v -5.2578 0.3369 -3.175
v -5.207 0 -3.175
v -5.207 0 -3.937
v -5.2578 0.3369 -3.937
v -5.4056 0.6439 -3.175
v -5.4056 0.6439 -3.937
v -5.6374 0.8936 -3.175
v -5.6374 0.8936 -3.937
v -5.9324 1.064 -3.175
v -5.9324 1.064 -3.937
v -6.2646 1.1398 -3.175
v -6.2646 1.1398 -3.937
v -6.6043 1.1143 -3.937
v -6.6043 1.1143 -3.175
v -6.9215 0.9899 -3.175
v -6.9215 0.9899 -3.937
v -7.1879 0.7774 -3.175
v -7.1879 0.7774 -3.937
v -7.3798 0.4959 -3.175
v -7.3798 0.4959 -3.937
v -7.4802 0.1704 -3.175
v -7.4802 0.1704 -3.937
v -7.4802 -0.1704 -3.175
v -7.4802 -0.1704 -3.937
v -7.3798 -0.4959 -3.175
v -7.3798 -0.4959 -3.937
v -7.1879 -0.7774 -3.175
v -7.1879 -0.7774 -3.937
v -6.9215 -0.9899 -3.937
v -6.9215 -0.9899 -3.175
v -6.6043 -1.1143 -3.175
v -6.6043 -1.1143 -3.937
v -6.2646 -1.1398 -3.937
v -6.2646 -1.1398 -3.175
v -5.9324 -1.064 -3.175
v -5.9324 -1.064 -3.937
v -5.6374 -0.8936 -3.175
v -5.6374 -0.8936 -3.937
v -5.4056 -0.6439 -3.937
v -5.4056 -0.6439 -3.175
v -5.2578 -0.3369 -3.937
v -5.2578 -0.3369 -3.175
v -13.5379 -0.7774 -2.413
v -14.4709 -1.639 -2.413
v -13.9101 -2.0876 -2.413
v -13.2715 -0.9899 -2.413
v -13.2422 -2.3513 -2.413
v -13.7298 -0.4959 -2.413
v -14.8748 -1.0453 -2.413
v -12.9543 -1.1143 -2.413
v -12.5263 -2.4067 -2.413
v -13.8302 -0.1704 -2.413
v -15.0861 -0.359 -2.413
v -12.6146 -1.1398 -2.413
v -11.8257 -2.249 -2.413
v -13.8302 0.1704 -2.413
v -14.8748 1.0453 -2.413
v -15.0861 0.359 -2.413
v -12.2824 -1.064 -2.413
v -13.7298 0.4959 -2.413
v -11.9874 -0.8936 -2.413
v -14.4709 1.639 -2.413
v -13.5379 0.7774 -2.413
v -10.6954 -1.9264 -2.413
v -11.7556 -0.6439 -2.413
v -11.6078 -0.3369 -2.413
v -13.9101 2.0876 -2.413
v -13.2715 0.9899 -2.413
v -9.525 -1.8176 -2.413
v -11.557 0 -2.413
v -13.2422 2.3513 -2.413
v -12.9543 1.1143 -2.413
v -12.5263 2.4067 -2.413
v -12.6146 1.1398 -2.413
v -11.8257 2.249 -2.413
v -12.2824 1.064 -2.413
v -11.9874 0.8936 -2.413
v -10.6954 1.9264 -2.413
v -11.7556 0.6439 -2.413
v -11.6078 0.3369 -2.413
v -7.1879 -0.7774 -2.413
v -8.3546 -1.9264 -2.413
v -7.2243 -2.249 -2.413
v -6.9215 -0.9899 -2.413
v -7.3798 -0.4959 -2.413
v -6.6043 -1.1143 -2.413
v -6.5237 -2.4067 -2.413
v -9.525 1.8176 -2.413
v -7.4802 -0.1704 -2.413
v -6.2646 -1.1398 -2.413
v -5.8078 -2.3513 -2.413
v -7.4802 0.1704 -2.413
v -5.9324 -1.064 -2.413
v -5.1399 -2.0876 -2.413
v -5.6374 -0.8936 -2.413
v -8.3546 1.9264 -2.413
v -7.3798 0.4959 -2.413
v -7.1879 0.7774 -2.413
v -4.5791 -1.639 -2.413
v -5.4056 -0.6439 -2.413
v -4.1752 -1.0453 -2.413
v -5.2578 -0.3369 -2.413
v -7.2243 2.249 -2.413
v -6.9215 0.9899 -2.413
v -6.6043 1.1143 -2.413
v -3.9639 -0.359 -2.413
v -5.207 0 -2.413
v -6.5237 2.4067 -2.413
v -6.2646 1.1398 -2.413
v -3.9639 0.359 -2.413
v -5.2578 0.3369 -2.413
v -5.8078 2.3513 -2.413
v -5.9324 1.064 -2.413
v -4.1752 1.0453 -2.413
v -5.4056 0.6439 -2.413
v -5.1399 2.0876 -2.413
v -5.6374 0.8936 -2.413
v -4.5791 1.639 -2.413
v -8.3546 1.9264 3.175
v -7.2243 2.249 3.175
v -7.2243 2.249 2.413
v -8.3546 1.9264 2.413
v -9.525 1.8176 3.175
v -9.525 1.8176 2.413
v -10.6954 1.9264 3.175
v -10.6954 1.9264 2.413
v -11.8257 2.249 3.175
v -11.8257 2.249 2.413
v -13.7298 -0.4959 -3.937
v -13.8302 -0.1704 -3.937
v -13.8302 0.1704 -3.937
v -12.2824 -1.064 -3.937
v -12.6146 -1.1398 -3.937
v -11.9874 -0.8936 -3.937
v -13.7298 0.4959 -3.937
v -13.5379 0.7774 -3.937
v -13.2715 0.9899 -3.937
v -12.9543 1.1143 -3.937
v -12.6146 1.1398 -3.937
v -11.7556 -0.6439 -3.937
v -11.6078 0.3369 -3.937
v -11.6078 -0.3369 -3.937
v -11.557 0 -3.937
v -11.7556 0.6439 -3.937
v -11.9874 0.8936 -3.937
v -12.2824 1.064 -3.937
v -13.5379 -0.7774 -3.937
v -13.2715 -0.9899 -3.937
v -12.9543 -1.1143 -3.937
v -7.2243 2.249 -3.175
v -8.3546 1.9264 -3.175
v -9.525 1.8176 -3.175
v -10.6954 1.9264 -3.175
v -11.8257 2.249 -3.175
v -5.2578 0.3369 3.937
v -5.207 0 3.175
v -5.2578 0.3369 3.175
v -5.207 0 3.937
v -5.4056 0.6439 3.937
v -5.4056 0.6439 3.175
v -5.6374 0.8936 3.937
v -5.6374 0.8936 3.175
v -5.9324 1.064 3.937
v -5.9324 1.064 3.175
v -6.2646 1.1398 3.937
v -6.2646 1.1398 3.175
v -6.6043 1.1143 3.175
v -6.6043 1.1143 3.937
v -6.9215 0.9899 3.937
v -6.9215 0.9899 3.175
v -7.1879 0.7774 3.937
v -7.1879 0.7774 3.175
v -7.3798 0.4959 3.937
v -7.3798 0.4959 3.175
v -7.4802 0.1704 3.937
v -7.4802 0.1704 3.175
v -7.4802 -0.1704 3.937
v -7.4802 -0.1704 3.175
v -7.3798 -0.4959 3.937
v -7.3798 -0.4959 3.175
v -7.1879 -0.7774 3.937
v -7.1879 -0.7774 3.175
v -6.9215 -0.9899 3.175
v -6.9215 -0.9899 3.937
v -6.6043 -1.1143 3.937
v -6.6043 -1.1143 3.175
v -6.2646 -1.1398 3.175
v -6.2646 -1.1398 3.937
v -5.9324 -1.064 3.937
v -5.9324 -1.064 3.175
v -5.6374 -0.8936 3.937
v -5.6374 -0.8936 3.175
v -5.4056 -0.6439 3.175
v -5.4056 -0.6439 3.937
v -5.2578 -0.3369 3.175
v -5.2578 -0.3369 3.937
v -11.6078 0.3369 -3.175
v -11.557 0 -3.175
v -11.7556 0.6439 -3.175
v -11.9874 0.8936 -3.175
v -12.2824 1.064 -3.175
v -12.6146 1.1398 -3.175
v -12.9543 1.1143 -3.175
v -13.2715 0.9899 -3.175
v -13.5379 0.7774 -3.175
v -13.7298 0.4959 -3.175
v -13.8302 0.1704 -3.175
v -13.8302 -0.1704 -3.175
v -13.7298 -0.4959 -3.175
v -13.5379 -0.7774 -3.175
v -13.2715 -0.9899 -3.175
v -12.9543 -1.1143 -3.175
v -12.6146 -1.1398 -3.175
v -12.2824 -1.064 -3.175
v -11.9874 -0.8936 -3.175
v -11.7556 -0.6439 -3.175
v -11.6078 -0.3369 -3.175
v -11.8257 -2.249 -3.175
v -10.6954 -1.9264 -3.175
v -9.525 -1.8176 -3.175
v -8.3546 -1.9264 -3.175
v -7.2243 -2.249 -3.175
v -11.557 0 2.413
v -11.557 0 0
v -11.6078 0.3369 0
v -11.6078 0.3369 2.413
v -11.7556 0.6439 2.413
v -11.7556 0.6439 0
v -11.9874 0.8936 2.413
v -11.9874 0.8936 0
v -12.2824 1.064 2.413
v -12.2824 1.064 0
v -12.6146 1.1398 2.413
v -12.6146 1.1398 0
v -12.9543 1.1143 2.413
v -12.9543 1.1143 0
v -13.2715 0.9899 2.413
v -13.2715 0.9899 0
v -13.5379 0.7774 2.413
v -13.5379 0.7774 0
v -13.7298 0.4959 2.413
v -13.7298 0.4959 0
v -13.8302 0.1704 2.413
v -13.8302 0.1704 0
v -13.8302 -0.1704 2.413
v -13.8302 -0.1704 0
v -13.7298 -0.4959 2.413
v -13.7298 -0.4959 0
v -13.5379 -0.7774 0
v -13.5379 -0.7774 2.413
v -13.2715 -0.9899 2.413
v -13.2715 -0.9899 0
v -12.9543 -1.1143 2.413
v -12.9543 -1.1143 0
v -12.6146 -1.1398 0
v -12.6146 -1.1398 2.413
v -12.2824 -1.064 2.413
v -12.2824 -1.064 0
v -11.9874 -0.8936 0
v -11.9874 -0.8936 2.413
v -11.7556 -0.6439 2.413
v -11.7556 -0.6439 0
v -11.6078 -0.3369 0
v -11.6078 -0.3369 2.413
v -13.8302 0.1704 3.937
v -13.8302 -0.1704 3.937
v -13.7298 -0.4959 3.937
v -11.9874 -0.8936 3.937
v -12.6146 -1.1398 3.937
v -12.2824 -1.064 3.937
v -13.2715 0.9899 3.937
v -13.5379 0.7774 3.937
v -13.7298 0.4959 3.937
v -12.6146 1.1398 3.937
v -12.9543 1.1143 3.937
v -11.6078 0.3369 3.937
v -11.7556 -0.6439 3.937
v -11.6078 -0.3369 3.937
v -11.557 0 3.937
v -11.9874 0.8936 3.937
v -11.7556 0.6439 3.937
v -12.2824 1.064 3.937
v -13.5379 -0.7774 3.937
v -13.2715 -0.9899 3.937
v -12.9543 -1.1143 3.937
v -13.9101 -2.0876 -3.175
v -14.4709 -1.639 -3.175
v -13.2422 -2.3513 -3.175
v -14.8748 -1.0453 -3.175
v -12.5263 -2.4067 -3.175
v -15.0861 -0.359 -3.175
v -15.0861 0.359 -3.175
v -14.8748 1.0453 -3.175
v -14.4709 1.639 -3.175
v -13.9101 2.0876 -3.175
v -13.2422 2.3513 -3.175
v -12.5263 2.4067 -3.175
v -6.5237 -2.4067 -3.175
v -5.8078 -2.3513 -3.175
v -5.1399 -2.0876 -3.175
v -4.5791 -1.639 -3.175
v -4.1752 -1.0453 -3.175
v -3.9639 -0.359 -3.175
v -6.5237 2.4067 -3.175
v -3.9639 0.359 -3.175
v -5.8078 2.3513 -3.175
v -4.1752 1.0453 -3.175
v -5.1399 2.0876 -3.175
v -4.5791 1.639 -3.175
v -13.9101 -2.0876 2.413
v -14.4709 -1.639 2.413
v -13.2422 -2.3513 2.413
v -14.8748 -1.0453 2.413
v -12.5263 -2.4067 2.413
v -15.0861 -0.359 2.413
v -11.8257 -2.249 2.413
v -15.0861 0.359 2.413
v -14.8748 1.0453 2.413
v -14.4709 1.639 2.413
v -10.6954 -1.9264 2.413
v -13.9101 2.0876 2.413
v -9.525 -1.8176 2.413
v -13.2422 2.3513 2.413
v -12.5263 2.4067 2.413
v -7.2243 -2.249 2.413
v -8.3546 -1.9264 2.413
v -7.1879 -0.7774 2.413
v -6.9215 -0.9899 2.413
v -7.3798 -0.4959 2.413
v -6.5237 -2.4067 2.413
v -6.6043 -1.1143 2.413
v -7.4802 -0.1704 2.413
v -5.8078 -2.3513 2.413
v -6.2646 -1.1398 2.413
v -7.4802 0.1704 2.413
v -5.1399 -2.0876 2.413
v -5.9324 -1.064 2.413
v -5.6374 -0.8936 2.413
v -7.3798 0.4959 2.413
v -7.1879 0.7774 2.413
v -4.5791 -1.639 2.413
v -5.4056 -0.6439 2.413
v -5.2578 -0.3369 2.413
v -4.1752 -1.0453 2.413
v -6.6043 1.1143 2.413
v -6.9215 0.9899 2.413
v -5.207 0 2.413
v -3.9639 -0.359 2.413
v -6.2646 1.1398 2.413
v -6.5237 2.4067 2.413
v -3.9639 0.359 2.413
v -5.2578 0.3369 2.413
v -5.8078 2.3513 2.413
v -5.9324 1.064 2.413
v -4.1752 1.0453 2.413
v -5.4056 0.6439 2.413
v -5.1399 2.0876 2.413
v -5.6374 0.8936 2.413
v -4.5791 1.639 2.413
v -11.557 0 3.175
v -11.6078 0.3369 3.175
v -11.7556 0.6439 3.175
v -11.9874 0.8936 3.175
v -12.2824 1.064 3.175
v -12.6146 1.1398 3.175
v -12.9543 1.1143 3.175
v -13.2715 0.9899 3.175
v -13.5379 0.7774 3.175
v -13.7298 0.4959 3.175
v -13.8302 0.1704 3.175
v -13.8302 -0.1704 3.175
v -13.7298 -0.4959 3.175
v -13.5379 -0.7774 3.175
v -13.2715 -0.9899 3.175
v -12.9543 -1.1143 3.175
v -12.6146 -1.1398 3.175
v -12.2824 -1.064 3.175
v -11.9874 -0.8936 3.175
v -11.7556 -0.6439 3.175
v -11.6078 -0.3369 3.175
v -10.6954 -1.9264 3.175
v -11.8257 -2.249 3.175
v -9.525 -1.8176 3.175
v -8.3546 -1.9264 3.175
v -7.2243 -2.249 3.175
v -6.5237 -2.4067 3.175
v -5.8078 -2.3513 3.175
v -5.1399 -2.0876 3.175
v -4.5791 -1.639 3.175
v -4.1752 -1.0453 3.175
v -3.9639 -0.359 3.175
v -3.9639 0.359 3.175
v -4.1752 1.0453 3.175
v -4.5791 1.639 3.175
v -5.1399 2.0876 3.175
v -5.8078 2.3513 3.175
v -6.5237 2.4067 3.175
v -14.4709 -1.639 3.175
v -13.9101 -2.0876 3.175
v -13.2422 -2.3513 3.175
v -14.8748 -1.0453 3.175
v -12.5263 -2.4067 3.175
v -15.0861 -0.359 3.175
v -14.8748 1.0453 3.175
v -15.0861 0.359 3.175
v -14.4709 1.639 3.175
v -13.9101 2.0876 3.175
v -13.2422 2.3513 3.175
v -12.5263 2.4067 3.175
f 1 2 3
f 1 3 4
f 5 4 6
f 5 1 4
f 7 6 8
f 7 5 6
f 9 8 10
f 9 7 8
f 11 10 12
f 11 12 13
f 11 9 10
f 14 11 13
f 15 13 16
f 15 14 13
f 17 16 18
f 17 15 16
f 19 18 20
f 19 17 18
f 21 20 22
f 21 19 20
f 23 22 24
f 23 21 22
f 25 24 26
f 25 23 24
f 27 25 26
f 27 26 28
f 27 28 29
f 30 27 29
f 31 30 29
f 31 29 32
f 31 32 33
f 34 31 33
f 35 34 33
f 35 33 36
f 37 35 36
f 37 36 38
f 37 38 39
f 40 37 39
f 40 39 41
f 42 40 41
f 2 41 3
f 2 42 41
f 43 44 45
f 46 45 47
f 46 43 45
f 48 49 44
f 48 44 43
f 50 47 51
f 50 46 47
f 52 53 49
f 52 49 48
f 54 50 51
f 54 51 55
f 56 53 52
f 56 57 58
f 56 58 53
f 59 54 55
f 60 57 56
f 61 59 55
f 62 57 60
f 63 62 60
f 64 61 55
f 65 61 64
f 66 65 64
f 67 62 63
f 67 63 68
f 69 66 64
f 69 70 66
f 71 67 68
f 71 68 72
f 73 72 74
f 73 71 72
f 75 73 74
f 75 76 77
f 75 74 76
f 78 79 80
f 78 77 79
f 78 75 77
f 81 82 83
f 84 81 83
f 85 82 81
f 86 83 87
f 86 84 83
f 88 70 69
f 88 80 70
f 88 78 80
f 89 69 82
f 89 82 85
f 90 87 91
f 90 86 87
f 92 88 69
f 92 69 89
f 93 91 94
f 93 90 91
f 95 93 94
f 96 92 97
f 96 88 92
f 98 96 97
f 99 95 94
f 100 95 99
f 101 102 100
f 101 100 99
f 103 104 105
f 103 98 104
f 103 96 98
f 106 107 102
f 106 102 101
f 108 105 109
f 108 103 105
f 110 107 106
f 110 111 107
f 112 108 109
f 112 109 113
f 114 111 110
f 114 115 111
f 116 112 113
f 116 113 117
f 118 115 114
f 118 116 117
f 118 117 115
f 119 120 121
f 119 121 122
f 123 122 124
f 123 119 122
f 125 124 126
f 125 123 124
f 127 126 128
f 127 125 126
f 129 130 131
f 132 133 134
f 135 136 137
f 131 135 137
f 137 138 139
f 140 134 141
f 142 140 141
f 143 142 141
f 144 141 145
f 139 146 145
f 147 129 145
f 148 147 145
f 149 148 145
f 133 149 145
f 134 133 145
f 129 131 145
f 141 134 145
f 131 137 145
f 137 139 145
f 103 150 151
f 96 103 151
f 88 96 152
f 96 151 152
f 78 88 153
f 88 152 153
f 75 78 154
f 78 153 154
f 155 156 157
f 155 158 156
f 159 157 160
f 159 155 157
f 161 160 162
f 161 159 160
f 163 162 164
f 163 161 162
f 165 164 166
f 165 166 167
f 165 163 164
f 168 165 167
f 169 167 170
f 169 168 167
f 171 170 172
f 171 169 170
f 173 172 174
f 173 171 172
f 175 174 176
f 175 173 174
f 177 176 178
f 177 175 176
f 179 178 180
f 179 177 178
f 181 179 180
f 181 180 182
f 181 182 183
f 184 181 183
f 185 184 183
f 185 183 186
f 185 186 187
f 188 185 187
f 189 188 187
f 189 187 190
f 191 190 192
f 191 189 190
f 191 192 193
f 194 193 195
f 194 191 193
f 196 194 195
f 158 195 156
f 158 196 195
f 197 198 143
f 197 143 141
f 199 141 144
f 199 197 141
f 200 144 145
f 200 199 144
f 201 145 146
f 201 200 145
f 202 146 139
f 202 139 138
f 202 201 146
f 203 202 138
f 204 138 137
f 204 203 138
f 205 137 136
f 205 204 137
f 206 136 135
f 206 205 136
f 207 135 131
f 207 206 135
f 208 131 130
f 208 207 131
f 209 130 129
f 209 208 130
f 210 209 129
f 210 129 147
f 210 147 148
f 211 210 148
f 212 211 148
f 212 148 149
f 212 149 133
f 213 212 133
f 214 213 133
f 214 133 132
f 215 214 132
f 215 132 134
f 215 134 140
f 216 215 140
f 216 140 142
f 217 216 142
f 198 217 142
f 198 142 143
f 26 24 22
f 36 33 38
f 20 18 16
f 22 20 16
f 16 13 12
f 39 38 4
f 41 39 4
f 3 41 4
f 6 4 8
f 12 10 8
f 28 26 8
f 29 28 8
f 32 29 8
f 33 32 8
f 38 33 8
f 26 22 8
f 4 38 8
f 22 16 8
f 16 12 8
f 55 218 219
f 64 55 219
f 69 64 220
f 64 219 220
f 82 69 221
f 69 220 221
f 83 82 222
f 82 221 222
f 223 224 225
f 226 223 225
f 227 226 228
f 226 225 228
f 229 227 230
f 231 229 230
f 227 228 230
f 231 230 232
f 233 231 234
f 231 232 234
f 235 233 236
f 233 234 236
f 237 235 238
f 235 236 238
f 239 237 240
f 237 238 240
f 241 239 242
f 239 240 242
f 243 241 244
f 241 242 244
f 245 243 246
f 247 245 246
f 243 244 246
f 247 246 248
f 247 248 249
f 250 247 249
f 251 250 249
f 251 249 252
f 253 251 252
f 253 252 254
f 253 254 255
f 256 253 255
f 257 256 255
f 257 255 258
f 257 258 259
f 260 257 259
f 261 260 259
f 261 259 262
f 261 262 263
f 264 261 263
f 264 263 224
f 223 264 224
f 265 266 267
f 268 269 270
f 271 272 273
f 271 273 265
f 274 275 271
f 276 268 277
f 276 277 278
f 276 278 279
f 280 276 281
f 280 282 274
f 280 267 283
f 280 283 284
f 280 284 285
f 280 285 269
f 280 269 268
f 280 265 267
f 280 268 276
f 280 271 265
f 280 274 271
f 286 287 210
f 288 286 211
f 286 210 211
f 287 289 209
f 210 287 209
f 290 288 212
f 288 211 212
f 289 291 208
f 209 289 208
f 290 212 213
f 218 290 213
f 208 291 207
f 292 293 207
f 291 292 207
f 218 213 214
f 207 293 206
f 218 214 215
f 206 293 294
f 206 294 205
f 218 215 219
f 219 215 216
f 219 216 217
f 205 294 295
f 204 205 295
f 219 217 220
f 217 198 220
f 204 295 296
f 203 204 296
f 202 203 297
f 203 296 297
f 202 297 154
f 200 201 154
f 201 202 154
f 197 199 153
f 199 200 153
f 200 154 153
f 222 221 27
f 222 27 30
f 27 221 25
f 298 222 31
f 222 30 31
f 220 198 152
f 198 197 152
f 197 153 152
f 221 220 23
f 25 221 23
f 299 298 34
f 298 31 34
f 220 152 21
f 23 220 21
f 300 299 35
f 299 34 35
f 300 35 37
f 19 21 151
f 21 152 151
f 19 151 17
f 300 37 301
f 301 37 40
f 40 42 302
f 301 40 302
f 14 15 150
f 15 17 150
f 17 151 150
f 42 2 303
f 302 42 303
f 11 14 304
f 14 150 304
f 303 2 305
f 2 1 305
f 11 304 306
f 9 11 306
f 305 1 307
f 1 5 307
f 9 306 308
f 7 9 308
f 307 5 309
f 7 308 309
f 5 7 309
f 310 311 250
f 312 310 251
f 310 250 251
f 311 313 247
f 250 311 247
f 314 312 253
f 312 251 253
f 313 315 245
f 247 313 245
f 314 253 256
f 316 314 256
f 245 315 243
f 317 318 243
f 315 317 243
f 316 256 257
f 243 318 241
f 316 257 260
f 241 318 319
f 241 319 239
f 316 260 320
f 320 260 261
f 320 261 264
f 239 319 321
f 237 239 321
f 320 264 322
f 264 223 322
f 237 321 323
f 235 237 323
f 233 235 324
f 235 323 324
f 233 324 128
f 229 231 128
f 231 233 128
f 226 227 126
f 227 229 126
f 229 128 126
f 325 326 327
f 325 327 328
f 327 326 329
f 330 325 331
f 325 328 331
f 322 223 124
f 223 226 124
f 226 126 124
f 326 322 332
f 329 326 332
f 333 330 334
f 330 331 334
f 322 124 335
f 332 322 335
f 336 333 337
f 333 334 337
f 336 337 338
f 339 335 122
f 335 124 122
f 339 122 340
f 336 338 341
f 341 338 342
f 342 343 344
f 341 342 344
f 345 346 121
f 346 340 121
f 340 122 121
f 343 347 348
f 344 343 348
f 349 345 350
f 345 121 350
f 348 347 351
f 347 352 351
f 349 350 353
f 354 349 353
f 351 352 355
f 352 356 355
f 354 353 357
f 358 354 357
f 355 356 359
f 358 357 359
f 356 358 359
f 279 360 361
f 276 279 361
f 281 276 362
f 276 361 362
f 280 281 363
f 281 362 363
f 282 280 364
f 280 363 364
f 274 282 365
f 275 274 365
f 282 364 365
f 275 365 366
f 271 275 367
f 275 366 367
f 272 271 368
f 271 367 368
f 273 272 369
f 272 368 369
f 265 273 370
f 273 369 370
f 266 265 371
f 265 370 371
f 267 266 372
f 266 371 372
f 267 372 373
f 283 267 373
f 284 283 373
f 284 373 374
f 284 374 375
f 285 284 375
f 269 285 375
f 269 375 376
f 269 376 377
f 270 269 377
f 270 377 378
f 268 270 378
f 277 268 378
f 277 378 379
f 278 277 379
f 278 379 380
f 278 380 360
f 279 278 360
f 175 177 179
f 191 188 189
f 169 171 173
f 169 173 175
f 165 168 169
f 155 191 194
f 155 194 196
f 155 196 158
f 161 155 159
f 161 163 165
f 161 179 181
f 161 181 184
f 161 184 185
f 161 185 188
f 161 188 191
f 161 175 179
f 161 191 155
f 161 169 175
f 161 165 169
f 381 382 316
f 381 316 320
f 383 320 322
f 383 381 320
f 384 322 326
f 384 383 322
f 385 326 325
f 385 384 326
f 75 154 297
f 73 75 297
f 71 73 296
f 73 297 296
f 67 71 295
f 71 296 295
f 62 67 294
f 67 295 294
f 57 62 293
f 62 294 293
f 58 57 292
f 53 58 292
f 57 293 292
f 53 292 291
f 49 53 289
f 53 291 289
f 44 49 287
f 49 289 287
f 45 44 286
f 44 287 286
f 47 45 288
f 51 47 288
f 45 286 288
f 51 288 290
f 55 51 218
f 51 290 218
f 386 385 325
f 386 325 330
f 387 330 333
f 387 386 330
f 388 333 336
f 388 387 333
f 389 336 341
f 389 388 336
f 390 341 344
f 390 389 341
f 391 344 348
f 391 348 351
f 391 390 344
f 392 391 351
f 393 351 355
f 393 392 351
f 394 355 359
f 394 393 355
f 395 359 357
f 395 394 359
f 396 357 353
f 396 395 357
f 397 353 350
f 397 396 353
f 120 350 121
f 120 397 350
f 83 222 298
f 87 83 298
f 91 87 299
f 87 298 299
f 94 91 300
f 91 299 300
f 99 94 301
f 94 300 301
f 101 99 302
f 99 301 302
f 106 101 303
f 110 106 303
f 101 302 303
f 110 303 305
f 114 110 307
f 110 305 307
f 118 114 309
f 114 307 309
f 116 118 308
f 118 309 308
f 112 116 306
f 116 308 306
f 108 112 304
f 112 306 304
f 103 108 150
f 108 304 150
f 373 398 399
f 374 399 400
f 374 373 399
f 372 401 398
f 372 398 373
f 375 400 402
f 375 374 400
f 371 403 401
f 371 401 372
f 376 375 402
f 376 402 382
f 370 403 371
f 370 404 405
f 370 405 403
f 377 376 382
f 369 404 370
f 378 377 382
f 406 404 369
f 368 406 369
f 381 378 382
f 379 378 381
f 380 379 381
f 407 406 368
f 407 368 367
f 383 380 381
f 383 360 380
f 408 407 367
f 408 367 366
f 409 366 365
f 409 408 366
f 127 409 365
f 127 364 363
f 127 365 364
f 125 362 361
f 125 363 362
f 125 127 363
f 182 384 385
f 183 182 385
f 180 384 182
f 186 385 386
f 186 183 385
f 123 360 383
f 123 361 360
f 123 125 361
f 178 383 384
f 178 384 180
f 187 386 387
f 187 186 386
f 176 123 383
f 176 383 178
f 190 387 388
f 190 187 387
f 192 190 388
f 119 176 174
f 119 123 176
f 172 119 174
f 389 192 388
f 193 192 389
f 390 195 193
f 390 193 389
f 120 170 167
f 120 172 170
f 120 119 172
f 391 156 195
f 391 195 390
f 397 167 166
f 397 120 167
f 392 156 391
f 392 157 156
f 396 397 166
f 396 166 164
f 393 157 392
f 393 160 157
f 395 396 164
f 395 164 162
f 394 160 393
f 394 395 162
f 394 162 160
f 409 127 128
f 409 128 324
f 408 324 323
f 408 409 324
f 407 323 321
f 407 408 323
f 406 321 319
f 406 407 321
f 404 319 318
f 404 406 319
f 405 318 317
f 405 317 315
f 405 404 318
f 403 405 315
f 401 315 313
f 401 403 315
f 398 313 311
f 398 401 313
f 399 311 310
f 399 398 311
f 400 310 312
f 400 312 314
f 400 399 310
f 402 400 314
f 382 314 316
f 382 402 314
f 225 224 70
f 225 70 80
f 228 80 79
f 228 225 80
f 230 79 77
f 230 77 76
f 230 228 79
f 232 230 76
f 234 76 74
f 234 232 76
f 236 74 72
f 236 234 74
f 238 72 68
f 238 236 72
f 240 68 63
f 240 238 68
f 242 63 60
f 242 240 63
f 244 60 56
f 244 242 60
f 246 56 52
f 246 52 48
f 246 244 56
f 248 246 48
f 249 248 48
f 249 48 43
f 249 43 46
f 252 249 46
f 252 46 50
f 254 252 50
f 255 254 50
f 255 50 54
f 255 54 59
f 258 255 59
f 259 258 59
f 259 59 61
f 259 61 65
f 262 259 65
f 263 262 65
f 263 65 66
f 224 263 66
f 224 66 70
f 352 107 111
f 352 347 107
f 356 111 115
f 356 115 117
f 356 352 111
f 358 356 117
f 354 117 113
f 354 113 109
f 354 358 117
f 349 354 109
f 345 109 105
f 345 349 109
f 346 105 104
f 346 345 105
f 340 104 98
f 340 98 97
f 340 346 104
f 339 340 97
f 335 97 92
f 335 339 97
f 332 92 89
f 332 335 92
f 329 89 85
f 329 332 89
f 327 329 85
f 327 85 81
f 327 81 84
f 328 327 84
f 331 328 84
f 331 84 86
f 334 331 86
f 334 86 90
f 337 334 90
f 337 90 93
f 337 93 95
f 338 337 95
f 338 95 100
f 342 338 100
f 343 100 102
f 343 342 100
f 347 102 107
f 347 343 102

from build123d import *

# Parameters (mm, degrees)
OUTER_START        = 3.175
SKETCH4_R          = 1.143
OUTER_LINK_1_DEPTH = 0.762
SKETCH5_R          = 1.143
PINS_DEPTH         = 3.937


with BuildPart() as part:
    # Sketch4 → outer link 1 (new body)
    with BuildSketch(Plane.XY.offset(OUTER_START)):
        with BuildLine():
            ThreePointArc((-7.224275362, -2.249046818), (-3.937, 0), (-7.224275362, 2.249046818))
            ThreePointArc((-7.224275362, 2.249046818), (-9.525, 1.817591077), (-11.825724638, 2.249046818))
            ThreePointArc((-11.825724638, 2.249046818), (-15.113, 0), (-11.825724638, -2.249046818))
            ThreePointArc((-11.825724638, -2.249046818), (-9.525, -1.817591077), (-7.224275362, -2.249046818))
        make_face()
        with Locations((-12.7, 0)):
            Circle(SKETCH4_R, mode=Mode.SUBTRACT)
        with Locations((-6.35, 0)):
            Circle(SKETCH4_R, mode=Mode.SUBTRACT)
    extrude(amount=-OUTER_LINK_1_DEPTH)


with BuildPart() as body_2:
    # outer link 2: mirrored copy
    add(part.part.mirror(Plane.XY))


with BuildPart() as part_1:
    add(part.part)

    add(body_2.part)  # pins merges body 2
    # Sketch5 → pins (add, symmetric)
    with BuildSketch(Plane.XY):
        with Locations((-12.7, 0)):
            Circle(SKETCH5_R)
        with Locations((-6.35, 0)):
            Circle(SKETCH5_R)
    extrude(amount=PINS_DEPTH, both=True)


solid = part_1.part
